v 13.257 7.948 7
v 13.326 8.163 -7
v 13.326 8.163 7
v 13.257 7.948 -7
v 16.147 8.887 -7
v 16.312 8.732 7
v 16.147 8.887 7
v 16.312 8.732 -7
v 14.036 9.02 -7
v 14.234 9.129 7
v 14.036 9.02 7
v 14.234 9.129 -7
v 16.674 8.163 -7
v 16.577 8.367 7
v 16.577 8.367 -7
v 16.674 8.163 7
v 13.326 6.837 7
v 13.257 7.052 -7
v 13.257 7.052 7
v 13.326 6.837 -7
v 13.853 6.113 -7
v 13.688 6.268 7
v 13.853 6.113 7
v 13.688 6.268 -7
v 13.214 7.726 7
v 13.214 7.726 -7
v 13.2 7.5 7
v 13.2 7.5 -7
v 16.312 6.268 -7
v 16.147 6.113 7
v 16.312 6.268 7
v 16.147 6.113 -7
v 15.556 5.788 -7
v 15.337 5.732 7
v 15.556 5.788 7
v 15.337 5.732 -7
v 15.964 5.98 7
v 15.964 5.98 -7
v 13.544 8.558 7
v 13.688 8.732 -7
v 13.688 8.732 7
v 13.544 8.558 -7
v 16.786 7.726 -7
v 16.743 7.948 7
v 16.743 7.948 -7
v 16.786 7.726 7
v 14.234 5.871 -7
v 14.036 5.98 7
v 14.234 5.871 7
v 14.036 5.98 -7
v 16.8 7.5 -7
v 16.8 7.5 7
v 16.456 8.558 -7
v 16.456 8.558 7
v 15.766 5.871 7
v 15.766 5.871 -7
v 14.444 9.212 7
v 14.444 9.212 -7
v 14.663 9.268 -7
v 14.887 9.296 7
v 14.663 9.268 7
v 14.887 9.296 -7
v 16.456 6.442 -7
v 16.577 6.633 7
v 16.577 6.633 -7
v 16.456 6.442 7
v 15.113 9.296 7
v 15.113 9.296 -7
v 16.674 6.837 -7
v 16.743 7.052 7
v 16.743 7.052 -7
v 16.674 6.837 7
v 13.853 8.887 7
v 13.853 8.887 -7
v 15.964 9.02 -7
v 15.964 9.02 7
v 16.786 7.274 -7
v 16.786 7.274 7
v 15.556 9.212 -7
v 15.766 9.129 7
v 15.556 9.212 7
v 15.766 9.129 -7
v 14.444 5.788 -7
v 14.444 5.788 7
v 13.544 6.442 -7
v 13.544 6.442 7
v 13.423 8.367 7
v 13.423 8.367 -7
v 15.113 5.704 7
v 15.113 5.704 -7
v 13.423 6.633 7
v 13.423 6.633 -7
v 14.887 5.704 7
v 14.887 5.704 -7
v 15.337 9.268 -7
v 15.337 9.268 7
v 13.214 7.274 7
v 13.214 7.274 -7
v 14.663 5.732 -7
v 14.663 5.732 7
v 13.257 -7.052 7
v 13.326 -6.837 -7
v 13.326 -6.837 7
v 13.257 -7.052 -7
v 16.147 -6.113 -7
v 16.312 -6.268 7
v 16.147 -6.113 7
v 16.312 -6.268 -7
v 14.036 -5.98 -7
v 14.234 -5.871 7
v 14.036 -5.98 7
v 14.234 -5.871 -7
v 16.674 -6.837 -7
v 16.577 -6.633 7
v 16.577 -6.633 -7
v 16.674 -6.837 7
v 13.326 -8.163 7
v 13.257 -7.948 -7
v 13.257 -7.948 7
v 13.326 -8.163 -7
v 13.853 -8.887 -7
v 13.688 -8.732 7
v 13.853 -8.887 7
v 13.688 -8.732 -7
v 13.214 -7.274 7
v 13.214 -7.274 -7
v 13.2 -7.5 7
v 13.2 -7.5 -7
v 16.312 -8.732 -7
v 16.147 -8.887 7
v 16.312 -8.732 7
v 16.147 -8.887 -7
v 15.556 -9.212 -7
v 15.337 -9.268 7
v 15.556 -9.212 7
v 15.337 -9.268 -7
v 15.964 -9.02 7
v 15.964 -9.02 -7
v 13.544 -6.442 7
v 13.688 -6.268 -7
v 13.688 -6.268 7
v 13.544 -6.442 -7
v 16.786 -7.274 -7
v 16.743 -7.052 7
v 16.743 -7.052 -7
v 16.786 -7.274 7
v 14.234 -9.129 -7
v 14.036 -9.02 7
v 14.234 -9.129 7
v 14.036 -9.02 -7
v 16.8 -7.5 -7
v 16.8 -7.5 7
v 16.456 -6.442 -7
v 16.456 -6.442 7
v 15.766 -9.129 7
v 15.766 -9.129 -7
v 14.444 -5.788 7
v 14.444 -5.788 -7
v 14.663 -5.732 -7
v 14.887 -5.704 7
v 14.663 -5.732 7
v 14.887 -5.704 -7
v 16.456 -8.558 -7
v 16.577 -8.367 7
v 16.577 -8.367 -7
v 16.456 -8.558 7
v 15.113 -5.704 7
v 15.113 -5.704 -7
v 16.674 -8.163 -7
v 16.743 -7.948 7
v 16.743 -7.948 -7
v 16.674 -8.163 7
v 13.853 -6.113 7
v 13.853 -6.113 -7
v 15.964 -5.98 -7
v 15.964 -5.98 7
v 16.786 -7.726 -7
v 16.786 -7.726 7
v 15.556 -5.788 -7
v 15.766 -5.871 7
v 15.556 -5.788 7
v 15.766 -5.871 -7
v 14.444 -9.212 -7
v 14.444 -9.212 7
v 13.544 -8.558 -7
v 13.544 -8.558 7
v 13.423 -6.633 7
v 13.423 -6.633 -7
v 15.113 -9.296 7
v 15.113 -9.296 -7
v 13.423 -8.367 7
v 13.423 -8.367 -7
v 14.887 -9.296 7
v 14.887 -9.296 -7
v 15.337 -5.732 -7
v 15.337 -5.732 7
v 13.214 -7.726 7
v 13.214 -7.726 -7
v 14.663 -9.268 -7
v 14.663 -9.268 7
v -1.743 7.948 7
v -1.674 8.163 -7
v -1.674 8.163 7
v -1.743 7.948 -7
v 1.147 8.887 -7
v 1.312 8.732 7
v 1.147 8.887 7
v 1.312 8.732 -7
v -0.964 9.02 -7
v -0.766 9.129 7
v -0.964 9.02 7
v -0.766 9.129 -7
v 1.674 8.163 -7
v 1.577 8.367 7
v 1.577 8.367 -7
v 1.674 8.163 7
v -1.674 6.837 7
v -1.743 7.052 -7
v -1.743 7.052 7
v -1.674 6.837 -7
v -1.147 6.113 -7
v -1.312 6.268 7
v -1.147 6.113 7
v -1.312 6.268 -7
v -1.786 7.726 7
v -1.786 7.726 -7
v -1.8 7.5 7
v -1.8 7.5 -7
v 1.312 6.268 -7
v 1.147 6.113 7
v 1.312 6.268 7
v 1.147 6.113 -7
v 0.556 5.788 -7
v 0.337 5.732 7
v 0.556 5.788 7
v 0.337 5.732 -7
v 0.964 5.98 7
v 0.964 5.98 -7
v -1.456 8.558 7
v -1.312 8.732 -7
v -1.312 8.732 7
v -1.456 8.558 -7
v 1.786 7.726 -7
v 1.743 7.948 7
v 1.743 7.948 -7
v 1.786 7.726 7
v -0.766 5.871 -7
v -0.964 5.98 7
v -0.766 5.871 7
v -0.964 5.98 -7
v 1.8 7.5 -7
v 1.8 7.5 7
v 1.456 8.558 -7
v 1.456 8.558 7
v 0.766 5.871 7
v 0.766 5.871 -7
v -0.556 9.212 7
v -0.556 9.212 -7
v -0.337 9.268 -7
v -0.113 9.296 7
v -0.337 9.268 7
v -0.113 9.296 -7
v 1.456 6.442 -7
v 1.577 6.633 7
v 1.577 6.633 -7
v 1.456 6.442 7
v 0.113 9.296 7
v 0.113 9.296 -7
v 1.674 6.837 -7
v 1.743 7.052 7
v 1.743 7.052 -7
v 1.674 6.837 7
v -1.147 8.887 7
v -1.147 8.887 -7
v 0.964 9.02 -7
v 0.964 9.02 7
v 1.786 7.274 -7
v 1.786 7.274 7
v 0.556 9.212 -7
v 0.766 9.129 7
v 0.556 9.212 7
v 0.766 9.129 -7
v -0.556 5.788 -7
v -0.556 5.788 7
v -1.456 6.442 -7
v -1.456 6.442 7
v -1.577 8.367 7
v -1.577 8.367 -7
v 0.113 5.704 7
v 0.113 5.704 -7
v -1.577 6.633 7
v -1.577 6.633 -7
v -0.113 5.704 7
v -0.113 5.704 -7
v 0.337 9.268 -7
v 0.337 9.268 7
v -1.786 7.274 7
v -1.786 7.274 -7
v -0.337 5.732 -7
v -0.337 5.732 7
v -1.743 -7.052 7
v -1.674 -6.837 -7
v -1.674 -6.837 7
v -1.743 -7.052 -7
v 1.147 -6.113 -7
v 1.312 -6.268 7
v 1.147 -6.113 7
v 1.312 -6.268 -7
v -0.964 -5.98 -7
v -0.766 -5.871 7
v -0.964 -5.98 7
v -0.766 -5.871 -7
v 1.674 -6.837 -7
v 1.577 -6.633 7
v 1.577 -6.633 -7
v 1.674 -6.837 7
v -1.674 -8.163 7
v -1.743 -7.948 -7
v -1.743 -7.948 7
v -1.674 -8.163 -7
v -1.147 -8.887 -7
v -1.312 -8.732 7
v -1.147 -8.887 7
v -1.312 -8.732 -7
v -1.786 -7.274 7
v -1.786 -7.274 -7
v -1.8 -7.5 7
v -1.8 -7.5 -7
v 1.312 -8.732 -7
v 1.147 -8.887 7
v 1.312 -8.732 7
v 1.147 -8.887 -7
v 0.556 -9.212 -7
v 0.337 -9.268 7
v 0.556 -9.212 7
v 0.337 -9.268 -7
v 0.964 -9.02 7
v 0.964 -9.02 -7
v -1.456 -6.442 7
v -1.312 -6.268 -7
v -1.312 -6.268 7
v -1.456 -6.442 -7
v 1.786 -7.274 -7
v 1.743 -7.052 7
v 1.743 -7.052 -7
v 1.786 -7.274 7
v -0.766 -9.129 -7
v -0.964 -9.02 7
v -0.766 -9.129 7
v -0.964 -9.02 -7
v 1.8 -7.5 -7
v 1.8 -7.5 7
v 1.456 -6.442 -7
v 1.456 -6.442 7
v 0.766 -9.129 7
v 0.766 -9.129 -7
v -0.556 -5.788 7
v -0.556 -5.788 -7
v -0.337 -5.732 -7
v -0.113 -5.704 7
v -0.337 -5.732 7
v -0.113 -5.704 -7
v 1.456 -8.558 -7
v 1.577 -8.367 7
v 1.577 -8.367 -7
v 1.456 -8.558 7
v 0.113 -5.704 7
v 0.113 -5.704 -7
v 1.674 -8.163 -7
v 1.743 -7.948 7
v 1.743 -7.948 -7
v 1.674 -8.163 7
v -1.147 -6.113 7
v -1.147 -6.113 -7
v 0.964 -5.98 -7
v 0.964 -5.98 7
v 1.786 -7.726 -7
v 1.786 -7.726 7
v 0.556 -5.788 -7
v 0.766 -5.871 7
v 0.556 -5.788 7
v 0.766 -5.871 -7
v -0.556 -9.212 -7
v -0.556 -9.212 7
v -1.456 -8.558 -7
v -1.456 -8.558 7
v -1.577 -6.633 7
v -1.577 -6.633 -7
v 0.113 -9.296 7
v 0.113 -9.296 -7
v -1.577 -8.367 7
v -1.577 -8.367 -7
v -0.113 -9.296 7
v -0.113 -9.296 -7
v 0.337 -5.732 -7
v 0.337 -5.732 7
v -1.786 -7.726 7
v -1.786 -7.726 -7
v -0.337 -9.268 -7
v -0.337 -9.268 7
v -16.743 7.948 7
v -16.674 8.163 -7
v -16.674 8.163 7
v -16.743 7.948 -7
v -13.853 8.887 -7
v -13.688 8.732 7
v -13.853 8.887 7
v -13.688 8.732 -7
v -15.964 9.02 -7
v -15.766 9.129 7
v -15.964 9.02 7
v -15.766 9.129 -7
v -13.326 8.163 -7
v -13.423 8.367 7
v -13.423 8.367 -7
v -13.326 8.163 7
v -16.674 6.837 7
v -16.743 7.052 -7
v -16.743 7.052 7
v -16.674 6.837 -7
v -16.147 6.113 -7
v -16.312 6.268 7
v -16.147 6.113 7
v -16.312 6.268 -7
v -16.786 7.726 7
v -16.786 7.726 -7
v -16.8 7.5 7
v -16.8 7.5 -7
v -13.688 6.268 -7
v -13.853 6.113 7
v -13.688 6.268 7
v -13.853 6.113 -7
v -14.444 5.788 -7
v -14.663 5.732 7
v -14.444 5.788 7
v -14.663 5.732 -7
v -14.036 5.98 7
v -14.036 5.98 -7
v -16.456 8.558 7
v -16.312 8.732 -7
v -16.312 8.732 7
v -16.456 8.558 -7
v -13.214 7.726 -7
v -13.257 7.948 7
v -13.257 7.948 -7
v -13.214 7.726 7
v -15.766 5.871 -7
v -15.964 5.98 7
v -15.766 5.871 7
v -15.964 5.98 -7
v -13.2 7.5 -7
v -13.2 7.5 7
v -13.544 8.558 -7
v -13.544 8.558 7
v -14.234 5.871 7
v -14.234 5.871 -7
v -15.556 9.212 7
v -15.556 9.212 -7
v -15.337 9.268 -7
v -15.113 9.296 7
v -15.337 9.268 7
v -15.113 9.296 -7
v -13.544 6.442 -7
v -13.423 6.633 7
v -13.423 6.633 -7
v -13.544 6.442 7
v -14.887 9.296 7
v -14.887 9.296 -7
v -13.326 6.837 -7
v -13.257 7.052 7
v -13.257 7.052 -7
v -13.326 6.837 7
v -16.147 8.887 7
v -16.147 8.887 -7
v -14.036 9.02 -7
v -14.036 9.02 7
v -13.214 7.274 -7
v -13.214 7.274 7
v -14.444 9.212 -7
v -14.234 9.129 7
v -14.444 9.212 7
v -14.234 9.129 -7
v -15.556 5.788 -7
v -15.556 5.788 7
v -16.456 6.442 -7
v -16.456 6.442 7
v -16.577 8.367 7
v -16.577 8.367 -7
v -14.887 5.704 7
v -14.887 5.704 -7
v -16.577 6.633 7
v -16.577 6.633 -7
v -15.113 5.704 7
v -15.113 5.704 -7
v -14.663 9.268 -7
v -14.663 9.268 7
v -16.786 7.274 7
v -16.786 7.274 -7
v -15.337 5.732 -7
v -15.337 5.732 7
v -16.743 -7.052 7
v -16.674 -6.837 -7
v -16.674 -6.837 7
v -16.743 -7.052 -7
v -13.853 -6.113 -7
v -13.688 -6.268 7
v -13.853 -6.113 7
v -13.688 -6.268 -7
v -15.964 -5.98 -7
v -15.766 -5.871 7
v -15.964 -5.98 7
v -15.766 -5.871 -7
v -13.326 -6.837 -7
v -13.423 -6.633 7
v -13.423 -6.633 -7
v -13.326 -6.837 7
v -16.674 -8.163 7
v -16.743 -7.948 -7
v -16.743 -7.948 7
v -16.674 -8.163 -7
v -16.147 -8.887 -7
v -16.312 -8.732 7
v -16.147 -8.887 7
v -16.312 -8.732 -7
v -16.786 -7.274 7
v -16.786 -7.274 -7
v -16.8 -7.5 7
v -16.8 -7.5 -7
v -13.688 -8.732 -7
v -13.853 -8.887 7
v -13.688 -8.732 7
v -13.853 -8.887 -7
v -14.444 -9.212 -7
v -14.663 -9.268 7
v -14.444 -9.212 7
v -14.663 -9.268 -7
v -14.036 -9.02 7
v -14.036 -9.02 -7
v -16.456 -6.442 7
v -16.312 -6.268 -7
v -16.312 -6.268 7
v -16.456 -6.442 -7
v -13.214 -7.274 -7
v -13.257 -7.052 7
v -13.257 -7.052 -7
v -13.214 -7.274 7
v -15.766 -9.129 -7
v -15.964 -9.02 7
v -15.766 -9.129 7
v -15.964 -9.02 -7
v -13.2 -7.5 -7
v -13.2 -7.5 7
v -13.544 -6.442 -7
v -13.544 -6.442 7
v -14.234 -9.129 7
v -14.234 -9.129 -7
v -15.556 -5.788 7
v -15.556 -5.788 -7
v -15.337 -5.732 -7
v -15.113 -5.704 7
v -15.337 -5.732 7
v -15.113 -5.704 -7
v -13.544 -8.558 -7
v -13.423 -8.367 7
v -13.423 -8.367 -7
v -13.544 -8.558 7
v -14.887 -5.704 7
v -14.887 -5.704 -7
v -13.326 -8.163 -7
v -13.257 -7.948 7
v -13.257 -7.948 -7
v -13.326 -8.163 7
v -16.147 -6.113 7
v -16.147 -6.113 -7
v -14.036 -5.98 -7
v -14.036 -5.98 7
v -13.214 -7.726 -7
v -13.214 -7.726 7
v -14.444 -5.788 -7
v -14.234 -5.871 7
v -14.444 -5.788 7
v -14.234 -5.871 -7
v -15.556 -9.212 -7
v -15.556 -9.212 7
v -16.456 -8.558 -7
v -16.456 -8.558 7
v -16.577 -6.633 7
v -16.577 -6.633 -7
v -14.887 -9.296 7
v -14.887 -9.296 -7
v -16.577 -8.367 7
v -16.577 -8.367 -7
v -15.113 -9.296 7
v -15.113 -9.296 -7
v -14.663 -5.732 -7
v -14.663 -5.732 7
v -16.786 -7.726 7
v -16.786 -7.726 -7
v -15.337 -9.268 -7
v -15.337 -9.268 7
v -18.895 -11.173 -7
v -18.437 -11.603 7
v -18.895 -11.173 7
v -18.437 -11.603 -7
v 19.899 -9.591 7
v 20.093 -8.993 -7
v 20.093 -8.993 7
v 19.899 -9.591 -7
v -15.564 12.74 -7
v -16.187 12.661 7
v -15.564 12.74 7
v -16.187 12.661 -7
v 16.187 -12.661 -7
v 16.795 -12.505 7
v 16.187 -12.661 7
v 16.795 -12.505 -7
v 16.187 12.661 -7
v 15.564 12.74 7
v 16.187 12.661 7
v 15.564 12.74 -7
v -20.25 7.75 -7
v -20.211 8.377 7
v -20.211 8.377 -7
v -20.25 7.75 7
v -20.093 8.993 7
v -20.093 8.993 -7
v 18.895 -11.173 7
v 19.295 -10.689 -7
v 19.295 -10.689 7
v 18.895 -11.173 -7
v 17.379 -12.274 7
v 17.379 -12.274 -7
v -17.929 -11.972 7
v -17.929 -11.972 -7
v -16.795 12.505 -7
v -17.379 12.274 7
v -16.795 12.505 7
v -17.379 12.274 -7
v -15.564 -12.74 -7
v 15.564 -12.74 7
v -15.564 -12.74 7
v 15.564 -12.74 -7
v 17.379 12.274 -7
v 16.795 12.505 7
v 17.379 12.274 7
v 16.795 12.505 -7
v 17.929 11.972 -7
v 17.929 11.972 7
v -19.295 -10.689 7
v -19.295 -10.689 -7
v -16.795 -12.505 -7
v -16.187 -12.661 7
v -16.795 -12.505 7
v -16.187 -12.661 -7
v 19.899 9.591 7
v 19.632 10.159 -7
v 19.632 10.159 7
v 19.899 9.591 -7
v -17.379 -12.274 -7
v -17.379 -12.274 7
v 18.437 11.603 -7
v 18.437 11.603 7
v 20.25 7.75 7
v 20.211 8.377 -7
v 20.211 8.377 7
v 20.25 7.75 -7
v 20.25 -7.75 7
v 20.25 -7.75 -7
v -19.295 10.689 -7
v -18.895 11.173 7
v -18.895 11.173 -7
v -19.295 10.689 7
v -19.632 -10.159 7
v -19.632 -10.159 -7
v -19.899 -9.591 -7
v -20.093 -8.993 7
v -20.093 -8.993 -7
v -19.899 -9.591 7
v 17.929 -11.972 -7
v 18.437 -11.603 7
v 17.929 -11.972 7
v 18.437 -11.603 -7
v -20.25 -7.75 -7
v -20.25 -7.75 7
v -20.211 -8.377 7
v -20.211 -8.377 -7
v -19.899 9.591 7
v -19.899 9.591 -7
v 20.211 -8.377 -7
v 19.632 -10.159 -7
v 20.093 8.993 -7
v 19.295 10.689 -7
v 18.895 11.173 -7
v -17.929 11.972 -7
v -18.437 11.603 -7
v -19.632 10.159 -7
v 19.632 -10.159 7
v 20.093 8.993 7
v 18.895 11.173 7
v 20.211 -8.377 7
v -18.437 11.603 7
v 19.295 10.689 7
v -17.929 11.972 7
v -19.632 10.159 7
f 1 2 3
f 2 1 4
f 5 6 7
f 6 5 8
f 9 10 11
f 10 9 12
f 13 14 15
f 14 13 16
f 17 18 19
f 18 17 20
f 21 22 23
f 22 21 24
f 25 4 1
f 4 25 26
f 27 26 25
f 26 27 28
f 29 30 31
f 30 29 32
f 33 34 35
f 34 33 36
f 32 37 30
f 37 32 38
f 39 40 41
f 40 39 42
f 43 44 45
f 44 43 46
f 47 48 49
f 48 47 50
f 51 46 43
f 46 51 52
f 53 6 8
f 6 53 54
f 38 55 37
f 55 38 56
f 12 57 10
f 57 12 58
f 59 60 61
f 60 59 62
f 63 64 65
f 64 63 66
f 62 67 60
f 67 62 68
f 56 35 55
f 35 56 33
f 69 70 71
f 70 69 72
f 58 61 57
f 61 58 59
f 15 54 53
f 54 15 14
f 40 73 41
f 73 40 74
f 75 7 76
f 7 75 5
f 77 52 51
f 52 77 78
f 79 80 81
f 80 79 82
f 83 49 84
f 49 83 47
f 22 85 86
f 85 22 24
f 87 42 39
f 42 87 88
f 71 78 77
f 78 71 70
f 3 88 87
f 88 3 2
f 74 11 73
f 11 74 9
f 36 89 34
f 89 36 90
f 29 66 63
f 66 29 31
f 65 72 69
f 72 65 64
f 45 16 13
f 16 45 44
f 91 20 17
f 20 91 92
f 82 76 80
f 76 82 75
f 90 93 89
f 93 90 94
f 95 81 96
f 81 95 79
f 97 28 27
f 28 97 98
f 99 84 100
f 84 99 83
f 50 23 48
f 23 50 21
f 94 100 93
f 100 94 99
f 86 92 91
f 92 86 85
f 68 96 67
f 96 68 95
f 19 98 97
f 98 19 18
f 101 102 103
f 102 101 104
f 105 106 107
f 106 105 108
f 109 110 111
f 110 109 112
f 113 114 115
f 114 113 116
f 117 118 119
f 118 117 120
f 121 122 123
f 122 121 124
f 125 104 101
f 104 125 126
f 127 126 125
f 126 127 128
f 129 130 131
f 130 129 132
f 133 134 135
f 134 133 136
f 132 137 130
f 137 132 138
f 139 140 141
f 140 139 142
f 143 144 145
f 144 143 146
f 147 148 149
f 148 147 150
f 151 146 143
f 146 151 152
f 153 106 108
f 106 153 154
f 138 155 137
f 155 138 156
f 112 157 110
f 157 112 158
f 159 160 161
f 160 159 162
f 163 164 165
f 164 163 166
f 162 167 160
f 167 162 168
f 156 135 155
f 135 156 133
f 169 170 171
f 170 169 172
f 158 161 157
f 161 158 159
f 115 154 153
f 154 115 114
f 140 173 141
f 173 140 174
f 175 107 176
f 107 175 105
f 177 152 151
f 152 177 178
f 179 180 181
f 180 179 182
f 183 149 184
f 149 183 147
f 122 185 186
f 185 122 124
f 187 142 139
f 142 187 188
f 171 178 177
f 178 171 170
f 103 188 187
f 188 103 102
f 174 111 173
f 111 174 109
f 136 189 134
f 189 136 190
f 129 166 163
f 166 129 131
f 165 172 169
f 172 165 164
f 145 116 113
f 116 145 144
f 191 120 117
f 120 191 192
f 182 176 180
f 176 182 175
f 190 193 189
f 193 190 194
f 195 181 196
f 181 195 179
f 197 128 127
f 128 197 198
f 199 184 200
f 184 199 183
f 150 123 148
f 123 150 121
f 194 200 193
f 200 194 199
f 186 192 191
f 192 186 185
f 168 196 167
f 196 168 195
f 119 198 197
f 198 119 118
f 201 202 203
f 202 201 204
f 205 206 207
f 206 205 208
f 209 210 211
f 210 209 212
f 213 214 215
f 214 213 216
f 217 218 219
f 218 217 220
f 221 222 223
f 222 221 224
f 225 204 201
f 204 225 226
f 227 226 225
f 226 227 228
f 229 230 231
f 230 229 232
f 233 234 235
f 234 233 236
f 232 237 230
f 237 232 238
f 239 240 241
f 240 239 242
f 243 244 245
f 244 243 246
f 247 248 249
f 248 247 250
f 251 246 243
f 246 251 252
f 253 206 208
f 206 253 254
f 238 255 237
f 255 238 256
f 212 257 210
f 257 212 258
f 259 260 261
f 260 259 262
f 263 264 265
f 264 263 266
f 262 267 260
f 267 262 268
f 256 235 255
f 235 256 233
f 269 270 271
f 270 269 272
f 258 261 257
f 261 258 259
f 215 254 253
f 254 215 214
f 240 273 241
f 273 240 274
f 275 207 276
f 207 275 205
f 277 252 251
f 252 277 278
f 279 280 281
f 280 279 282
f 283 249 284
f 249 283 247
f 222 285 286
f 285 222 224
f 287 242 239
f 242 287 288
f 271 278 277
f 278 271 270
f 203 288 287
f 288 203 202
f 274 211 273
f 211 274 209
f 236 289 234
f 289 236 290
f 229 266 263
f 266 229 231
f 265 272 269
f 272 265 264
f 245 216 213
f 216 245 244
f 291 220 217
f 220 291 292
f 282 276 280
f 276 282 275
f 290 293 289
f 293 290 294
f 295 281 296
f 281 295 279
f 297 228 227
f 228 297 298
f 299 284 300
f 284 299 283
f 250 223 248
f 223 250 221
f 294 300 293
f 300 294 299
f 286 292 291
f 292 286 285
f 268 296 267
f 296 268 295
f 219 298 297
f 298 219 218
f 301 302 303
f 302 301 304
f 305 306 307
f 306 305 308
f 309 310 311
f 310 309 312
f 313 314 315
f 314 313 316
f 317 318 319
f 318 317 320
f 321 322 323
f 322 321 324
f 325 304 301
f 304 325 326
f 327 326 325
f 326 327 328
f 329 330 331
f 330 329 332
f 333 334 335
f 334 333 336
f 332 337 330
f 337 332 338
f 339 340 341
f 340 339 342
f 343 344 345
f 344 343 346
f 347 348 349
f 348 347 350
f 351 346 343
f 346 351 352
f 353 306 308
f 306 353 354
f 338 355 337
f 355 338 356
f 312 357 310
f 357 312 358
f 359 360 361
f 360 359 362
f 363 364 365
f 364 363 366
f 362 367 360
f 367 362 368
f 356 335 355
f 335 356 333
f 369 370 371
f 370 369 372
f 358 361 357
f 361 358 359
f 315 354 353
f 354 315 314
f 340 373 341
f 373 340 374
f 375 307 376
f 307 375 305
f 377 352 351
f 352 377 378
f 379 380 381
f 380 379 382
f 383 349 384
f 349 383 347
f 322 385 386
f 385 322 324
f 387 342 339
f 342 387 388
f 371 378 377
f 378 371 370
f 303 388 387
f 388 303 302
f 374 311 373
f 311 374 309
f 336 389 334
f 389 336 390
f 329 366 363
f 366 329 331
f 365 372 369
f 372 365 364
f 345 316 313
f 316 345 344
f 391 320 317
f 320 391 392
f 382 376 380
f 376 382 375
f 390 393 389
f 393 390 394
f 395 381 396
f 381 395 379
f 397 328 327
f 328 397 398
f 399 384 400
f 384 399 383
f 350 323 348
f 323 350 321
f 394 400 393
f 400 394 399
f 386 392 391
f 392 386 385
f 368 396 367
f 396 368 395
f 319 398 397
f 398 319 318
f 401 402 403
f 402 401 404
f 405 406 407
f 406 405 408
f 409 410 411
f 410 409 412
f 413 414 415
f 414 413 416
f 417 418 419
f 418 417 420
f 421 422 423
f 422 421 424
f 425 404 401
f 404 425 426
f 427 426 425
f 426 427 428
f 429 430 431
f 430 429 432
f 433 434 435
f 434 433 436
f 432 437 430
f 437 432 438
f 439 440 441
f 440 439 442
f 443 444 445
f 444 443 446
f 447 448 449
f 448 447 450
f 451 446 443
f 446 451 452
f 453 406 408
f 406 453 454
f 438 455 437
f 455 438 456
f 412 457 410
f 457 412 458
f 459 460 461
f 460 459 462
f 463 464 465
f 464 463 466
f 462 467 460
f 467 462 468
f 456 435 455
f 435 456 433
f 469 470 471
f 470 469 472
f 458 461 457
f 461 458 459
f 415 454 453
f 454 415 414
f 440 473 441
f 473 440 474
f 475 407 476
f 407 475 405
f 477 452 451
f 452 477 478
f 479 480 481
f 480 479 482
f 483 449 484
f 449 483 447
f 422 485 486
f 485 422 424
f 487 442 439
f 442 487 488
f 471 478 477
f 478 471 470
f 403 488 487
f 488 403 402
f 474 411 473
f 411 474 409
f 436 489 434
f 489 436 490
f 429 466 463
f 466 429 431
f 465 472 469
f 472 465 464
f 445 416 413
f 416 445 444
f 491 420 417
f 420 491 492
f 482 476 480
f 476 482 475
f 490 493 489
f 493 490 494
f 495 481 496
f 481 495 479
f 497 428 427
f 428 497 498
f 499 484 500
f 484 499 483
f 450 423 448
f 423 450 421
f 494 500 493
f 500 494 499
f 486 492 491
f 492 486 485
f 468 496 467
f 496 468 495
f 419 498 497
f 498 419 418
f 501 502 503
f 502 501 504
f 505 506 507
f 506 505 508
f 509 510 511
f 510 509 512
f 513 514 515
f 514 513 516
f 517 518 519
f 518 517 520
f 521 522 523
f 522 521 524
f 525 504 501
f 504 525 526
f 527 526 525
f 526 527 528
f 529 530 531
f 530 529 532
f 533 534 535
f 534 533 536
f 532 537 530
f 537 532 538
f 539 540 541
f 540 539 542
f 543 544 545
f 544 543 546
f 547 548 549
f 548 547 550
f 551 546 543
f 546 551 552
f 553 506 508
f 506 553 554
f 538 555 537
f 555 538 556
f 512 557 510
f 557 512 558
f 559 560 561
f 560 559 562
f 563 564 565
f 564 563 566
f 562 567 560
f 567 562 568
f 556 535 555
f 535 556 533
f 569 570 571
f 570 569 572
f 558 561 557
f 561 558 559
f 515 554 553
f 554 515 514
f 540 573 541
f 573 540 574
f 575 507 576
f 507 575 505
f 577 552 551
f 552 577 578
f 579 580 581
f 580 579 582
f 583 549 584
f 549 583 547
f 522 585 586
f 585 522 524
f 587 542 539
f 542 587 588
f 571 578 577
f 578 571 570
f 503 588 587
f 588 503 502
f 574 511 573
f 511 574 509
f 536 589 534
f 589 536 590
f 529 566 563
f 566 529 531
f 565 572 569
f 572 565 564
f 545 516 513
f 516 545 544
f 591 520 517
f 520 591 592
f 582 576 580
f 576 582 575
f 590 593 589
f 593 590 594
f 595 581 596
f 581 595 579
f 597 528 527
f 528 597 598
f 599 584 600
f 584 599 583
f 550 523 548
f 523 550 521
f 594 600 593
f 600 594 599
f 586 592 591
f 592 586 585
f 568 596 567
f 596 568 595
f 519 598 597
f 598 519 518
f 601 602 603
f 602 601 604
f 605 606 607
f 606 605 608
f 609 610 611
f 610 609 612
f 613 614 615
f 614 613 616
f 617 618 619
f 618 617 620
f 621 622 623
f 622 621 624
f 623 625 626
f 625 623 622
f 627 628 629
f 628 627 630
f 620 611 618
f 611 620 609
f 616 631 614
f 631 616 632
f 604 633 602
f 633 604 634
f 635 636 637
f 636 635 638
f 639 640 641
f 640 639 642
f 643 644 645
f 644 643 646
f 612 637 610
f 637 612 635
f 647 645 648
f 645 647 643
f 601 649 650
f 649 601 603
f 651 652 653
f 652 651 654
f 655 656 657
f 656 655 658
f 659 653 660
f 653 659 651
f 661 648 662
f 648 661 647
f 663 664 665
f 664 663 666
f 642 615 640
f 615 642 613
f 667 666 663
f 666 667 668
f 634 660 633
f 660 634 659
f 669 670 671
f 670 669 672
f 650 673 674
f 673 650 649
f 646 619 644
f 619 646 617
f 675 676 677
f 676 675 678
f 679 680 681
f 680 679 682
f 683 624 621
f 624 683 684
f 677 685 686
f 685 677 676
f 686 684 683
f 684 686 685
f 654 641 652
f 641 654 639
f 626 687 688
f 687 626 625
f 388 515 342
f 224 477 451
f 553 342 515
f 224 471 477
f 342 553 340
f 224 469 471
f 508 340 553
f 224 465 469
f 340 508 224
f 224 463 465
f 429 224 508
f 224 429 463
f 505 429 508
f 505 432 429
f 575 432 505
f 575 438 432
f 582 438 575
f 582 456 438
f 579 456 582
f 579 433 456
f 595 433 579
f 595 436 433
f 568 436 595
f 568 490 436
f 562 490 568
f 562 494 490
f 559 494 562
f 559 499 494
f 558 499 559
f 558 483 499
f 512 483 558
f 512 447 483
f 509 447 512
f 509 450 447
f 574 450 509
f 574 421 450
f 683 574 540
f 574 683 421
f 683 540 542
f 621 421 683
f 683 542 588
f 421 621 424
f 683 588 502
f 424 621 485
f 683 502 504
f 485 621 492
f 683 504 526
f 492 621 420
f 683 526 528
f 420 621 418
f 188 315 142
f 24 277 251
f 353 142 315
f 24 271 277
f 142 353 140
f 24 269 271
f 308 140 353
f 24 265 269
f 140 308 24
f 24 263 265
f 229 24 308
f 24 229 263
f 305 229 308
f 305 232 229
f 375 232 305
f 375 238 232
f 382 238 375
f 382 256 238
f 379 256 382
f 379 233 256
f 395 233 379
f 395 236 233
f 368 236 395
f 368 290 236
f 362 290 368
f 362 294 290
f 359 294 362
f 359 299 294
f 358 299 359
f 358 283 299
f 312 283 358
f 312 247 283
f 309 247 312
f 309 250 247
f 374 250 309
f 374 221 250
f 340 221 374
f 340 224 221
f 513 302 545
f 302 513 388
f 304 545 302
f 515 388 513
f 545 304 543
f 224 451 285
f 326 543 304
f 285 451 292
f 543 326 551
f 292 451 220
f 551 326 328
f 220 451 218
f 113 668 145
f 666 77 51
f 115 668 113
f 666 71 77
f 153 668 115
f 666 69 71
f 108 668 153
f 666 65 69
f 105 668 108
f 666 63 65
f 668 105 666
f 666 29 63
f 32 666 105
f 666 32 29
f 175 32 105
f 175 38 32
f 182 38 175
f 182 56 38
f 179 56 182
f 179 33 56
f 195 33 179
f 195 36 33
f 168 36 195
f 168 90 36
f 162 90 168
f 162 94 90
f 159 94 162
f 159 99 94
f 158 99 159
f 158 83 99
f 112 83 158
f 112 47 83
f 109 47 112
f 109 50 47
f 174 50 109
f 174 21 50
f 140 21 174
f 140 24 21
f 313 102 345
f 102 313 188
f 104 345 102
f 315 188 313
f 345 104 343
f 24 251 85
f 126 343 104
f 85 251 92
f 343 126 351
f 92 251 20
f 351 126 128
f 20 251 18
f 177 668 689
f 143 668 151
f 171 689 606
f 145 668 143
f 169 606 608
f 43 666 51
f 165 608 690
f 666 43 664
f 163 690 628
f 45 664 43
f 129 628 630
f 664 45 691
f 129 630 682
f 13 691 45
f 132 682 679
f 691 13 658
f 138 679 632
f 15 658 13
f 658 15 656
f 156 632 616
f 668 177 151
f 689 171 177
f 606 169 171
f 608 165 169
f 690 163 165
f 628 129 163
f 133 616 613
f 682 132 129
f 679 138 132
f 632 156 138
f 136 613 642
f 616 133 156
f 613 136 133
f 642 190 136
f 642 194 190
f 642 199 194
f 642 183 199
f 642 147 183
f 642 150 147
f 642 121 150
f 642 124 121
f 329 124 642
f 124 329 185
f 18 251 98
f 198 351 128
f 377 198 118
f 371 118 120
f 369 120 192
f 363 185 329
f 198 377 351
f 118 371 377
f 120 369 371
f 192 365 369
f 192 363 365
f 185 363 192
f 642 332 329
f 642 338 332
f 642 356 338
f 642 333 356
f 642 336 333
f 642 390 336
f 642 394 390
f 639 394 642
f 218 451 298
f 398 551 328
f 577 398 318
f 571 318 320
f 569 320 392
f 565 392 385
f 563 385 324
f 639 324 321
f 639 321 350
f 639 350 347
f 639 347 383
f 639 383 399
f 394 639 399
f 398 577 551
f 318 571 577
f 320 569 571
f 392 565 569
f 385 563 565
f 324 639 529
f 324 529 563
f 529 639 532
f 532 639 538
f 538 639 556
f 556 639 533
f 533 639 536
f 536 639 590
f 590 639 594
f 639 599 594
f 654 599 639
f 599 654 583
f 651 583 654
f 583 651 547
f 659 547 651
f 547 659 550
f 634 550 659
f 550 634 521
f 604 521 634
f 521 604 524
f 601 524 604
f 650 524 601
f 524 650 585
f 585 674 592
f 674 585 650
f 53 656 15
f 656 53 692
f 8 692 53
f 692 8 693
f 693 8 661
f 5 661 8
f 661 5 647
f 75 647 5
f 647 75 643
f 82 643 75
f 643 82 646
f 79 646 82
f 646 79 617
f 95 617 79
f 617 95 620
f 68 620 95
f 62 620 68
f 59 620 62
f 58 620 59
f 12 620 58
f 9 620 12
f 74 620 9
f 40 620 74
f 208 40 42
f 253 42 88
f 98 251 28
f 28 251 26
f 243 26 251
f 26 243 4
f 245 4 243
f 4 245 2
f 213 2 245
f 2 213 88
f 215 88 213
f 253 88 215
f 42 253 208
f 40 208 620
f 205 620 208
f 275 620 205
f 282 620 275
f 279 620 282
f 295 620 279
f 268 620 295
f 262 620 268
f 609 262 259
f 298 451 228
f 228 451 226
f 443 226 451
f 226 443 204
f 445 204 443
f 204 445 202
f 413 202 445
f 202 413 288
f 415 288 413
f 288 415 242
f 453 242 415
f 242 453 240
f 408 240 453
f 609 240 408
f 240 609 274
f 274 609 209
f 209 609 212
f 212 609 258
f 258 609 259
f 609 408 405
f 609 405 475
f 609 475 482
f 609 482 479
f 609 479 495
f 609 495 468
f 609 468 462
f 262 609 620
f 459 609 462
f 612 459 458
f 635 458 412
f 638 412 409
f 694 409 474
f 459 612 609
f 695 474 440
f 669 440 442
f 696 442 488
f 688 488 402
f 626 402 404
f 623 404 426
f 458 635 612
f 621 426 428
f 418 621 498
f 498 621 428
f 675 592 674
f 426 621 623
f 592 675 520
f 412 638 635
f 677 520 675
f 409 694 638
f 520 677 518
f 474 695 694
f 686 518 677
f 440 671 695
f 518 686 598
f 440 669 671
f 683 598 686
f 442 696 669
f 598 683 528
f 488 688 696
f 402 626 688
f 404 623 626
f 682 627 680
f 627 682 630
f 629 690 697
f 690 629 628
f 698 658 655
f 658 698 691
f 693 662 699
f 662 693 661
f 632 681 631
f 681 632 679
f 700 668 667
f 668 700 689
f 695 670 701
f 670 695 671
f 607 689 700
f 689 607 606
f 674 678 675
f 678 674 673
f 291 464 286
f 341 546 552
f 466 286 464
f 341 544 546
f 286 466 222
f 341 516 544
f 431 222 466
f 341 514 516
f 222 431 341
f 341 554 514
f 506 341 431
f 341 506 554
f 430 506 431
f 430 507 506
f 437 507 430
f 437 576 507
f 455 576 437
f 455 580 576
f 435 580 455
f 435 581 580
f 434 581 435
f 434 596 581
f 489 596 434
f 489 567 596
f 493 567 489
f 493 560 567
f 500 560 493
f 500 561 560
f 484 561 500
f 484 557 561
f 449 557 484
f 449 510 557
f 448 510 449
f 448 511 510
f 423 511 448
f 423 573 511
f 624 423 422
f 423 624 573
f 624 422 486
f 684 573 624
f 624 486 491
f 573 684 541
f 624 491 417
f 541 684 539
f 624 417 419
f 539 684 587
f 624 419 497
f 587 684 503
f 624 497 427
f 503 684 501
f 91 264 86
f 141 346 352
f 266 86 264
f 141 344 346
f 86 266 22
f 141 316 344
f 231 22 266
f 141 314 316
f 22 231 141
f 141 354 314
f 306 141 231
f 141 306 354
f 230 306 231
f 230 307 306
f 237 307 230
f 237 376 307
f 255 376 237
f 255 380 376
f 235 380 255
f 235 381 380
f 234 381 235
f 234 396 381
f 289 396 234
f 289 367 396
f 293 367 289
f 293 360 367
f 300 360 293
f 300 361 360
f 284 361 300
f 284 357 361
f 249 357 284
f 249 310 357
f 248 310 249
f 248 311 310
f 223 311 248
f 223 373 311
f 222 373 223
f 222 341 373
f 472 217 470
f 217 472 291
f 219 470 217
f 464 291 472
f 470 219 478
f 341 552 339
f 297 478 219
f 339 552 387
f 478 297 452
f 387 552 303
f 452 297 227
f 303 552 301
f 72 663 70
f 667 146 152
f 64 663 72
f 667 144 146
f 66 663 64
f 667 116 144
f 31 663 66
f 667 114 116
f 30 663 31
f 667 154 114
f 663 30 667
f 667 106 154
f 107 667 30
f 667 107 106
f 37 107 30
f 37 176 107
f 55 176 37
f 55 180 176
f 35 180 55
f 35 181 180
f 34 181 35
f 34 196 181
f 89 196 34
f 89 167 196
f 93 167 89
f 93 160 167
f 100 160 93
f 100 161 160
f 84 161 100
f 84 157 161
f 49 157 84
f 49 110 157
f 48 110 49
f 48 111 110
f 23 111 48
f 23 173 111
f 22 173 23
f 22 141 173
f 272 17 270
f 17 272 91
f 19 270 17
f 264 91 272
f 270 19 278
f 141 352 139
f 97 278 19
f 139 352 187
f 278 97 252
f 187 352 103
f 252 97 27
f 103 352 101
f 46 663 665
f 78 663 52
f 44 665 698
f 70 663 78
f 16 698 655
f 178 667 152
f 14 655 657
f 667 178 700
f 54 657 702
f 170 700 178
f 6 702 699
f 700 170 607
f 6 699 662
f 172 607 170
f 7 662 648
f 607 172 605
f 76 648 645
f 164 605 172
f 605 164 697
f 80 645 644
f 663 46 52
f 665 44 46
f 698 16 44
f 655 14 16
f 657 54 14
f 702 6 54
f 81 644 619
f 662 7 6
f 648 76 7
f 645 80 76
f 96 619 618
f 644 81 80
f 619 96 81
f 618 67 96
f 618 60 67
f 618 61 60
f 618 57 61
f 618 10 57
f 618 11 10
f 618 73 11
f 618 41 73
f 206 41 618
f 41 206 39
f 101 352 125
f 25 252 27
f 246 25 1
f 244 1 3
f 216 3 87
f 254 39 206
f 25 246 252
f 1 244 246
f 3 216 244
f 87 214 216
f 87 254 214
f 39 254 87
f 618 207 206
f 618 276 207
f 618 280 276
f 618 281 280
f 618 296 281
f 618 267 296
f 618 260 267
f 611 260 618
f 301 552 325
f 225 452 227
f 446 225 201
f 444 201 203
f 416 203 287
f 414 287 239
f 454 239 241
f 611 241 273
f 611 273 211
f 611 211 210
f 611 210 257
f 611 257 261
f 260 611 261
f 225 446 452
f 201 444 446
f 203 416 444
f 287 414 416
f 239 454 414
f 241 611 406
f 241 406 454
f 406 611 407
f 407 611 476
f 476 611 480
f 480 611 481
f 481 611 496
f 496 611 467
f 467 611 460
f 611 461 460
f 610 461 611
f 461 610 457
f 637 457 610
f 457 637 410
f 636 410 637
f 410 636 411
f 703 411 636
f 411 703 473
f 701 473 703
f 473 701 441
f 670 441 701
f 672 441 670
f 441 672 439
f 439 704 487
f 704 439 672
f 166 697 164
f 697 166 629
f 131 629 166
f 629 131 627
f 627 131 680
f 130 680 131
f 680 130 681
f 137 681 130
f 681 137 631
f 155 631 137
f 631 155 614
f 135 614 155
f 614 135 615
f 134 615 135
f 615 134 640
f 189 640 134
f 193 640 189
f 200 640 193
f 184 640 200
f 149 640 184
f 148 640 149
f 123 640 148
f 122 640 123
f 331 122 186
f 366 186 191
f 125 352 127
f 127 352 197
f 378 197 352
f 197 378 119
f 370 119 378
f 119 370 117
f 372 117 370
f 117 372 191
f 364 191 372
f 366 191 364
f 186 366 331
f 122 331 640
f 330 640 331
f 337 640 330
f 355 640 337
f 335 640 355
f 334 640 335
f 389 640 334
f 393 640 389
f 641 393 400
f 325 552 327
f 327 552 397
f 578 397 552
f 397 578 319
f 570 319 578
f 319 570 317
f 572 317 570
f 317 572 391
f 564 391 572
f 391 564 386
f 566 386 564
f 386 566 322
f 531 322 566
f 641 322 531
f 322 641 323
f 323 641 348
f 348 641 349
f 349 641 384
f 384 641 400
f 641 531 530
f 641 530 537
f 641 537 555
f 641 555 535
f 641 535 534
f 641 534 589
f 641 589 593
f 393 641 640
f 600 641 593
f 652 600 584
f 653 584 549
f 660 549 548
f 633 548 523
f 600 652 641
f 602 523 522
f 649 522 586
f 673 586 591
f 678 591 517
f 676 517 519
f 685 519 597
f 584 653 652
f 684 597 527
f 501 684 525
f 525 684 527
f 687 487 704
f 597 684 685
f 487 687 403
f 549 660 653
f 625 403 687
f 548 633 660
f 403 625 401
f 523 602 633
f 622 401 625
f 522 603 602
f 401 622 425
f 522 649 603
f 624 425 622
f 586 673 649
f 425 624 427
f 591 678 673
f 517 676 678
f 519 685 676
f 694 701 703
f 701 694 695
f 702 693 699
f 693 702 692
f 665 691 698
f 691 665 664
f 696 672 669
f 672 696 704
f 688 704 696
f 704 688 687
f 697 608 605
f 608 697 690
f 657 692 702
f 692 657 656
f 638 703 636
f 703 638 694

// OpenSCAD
$fn = 50;


difference() {
	union() {
		*color(alpha = 1.0000000000, c = "gray") {
			translate(v = [0, 14, -7.0000000000]) {
				linear_extrude(height = 1.5000000000) {
					text(font = "Arial:style=Bold", halign = "center", size = 4.5000000000, text = "COMMENT description rounded_rectangle_shape_p_type_0_0_-7.0_pos_timing_belt_clamp_gt2_extra_2.5_width_1.5_height_14_thickness_40.5_25.5_14_size", valign = "center");
				}
			}
		}
		translate(v = [0, 0, -7.0000000000]) {
			hull() {
				translate(v = [-15.2500000000, 7.7500000000, 0]) {
					cylinder(h = 14, r = 5);
				}
				translate(v = [15.2500000000, 7.7500000000, 0]) {
					cylinder(h = 14, r = 5);
				}
				translate(v = [-15.2500000000, -7.7500000000, 0]) {
					cylinder(h = 14, r = 5);
				}
				translate(v = [15.2500000000, -7.7500000000, 0]) {
					cylinder(h = 14, r = 5);
				}
			}
		}
	}
	union() {
		translate(v = [15, 7.5000000000, 0]) {
			rotate(a = [0, 0, 0]) {
				difference() {
					union() {
						translate(v = [0, 0, -50.0000000000]) {
							cylinder(h = 100, r = 1.8000000000);
						}
					}
					union();
				}
			}
		}
		translate(v = [15, -7.5000000000, 0]) {
			rotate(a = [0, 0, 0]) {
				difference() {
					union() {
						translate(v = [0, 0, -50.0000000000]) {
							cylinder(h = 100, r = 1.8000000000);
						}
					}
					union();
				}
			}
		}
		translate(v = [0, 7.5000000000, 0]) {
			rotate(a = [0, 0, 0]) {
				difference() {
					union() {
						translate(v = [0, 0, -50.0000000000]) {
							cylinder(h = 100, r = 1.8000000000);
						}
					}
					union();
				}
			}
		}
		translate(v = [0, -7.5000000000, 0]) {
			rotate(a = [0, 0, 0]) {
				difference() {
					union() {
						translate(v = [0, 0, -50.0000000000]) {
							cylinder(h = 100, r = 1.8000000000);
						}
					}
					union();
				}
			}
		}
		translate(v = [-15, 7.5000000000, 0]) {
			rotate(a = [0, 0, 0]) {
				difference() {
					union() {
						translate(v = [0, 0, -50.0000000000]) {
							cylinder(h = 100, r = 1.8000000000);
						}
					}
					union();
				}
			}
		}
		translate(v = [-15, -7.5000000000, 0]) {
			rotate(a = [0, 0, 0]) {
				difference() {
					union() {
						translate(v = [0, 0, -50.0000000000]) {
							cylinder(h = 100, r = 1.8000000000);
						}
					}
					union();
				}
			}
		}
		*color(alpha = 1.0000000000, c = "gray") {
			translate(v = [15, 21.5000000000, 0]) {
				linear_extrude(height = 1.5000000000) {
					text(font = "Arial:style=Bold", halign = "center", size = 4.5000000000, text = "COMMENT description oobb_hole_new_shape_n_type_m3_radius_name_15_7.5_0_pos_timing_belt_clamp_gt2_extra_2.5_width_1.5_height_14_thickness_middle_zz_0_0_0_rot", valign = "center");
				}
			}
		}
		*color(alpha = 1.0000000000, c = "gray") {
			translate(v = [15, 6.5000000000, 0]) {
				linear_extrude(height = 1.5000000000) {
					text(font = "Arial:style=Bold", halign = "center", size = 4.5000000000, text = "COMMENT description oobb_hole_new_shape_n_type_m3_radius_name_15_-7.5_0_pos_timing_belt_clamp_gt2_extra_2.5_width_1.5_height_14_thickness_middle_zz_0_0_0_rot", valign = "center");
				}
			}
		}
		*color(alpha = 1.0000000000, c = "gray") {
			translate(v = [0, 21.5000000000, 0]) {
				linear_extrude(height = 1.5000000000) {
					text(font = "Arial:style=Bold", halign = "center", size = 4.5000000000, text = "COMMENT description oobb_hole_new_shape_n_type_m3_radius_name_0_7.5_0_pos_timing_belt_clamp_gt2_extra_2.5_width_1.5_height_14_thickness_middle_zz_0_0_0_rot", valign = "center");
				}
			}
		}
		*color(alpha = 1.0000000000, c = "gray") {
			translate(v = [0, 6.5000000000, 0]) {
				linear_extrude(height = 1.5000000000) {
					text(font = "Arial:style=Bold", halign = "center", size = 4.5000000000, text = "COMMENT description oobb_hole_new_shape_n_type_m3_radius_name_0_-7.5_0_pos_timing_belt_clamp_gt2_extra_2.5_width_1.5_height_14_thickness_middle_zz_0_0_0_rot", valign = "center");
				}
			}
		}
		*color(alpha = 1.0000000000, c = "gray") {
			translate(v = [-15, 21.5000000000, 0]) {
				linear_extrude(height = 1.5000000000) {
					text(font = "Arial:style=Bold", halign = "center", size = 4.5000000000, text = "COMMENT description oobb_hole_new_shape_n_type_m3_radius_name_-15_7.5_0_pos_timing_belt_clamp_gt2_extra_2.5_width_1.5_height_14_thickness_middle_zz_0_0_0_rot", valign = "center");
				}
			}
		}
		*color(alpha = 1.0000000000, c = "gray") {
			translate(v = [-15, 6.5000000000, 0]) {
				linear_extrude(height = 1.5000000000) {
					text(font = "Arial:style=Bold", halign = "center", size = 4.5000000000, text = "COMMENT description oobb_hole_new_shape_n_type_m3_radius_name_-15_-7.5_0_pos_timing_belt_clamp_gt2_extra_2.5_width_1.5_height_14_thickness_middle_zz_0_0_0_rot", valign = "center");
				}
			}
		}
	}
}
